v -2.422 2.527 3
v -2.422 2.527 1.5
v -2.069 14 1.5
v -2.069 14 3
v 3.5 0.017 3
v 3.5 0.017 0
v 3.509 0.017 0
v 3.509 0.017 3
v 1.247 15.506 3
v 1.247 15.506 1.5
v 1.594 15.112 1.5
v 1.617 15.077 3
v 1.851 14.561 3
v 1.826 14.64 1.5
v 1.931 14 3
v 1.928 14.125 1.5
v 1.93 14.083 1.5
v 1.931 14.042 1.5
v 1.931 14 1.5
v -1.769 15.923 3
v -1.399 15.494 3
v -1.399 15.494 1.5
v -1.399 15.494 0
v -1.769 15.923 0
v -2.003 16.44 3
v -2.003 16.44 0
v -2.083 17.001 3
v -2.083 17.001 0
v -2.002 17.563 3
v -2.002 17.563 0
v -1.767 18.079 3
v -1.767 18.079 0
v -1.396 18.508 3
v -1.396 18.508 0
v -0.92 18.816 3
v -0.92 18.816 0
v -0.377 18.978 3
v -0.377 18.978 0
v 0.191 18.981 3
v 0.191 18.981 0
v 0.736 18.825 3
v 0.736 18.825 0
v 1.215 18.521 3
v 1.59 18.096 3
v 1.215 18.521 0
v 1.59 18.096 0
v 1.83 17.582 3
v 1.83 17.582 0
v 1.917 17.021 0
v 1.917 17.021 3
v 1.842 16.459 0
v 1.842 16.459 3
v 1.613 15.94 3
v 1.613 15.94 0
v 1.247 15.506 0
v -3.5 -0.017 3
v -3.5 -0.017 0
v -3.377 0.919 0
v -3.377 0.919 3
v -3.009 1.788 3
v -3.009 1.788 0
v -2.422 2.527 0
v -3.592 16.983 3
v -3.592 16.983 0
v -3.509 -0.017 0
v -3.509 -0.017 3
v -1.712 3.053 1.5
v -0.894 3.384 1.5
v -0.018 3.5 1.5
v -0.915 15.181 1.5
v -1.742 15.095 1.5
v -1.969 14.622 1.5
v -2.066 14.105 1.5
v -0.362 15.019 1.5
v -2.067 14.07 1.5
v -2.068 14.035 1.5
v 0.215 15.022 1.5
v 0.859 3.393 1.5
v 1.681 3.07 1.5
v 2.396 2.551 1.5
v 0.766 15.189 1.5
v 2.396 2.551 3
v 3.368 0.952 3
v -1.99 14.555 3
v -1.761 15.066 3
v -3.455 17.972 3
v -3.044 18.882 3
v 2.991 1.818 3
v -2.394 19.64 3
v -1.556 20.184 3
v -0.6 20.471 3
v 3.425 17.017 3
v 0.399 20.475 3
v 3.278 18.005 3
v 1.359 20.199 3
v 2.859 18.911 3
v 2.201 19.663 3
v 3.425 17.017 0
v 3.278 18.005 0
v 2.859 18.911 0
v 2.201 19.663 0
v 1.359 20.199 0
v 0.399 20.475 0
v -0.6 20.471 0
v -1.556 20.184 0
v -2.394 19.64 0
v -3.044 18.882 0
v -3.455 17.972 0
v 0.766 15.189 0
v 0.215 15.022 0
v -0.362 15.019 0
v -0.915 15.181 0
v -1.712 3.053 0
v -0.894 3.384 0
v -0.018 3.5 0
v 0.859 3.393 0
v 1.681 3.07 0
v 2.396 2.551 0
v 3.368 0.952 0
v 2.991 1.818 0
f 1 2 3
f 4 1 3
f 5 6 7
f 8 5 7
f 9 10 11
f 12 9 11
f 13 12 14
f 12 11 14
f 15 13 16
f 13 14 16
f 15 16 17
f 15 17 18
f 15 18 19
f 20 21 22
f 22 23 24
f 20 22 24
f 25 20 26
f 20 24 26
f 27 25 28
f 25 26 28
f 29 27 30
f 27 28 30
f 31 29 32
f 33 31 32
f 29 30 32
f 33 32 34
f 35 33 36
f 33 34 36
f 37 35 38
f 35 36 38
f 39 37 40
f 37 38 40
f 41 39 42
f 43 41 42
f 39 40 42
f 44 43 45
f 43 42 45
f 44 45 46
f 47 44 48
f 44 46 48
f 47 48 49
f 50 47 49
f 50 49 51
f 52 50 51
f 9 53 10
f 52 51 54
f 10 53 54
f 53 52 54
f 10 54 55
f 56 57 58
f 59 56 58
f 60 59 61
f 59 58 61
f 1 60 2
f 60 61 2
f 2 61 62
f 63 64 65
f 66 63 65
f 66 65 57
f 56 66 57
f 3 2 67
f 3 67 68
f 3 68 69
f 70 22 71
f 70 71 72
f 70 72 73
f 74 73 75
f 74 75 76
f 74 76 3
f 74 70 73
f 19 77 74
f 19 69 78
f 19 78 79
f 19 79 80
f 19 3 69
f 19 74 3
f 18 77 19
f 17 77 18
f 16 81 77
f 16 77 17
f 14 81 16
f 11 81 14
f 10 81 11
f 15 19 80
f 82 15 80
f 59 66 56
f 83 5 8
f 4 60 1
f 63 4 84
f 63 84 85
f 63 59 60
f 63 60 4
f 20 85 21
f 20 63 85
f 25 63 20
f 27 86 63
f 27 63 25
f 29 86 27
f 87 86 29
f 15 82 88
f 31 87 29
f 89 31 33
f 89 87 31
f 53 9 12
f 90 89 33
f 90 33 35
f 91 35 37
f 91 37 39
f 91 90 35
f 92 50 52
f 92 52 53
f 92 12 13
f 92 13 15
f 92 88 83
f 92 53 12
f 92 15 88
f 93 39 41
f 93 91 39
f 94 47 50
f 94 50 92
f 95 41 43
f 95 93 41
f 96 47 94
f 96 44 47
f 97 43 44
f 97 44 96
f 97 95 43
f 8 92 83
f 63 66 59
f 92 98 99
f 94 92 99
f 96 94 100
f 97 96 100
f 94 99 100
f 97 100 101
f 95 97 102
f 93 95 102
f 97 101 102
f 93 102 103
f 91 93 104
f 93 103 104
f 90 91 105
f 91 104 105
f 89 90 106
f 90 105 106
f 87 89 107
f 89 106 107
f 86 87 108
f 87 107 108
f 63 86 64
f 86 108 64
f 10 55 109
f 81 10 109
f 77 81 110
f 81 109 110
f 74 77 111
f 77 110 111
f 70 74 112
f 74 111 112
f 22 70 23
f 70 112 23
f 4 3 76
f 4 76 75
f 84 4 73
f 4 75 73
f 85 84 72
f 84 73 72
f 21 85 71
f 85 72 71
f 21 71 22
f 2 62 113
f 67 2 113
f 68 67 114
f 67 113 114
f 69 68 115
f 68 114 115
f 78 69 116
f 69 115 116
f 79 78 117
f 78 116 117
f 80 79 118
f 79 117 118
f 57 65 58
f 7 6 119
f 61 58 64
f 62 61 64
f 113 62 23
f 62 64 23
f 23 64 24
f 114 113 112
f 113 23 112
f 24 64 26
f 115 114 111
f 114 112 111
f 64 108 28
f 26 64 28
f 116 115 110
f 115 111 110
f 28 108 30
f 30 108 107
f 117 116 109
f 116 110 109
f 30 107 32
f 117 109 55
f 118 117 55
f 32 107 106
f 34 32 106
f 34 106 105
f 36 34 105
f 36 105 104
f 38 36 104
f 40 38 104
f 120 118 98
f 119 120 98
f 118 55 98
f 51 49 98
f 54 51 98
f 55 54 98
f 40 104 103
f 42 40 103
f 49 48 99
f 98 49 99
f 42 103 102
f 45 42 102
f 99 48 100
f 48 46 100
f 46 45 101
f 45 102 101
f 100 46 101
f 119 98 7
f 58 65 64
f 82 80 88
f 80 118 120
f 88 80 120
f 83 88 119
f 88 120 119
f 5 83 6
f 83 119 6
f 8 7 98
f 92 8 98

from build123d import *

# Parameters (mm, degrees)
BOSS_EXTRU_1_DEPTH = 3
BOSS_EXTRU_2_DEPTH = 1.5


# Read off the part's stored shape, not the designer's step: Boss.-Extru.1
with BuildPart() as part:
    # Boss.-Extru.1 outline → Boss.-Extru.1 (new body)
    with BuildSketch(Plane.XY):
        with BuildLine():
            Line((-2.42213609, 2.526510788), (-2.068537469, 14))
            ThreePointArc((-2.068537469, 14), (-1.893416293, 14.818423654), (-1.398720191, 15.493523995))
            ThreePointArc((-1.398720191, 15.493523995), (-0.093015019, 18.999976034), (1.246958654, 15.506476005))
            ThreePointArc((1.246958654, 15.506476005), (1.752312916, 14.827347495), (1.931462531, 14))
            Line((1.931462531, 14), (2.396407287, 2.550927696))
            ThreePointArc((2.396407287, 2.550927696), (3.208864051, 1.397566279), (3.49995806, 0.017134162))
            Line((3.49995806, 0.017134162), (3.508676576, 0.017176844))
            Line((3.508676576, 0.017176844), (3.425452507, 17.017176844))
            ThreePointArc((3.425452507, 17.017176844), (-0.100400913, 20.508676576), (-3.591900645, 16.982823156))
            Line((-3.591900645, 16.982823156), (-3.508676576, -0.017176844))
            Line((-3.508676576, -0.017176844), (-3.49995806, -0.017134162))
            ThreePointArc((-3.49995806, -0.017134162), (-3.222628149, 1.3655284), (-2.42213609, 2.526510788))
        make_face()
    extrude(amount=BOSS_EXTRU_1_DEPTH)

    # Esquisse1<5> → Boss.-Extru.2 (add)
    with BuildSketch(Plane.XY):
        with BuildLine():
            ThreePointArc((-2.065775424, 14.105074011), (-2.067846838, 14.052555154), (-2.068537469, 14))
            Line((-2.068537469, 14), (-1.902868639, 14))
            ThreePointArc((-1.902868639, 14), (-1.985047825, 14.051411734), (-2.065775424, 14.105074011))
        make_face()
        with BuildLine():
            Line((-1.902868639, 14), (-2.068537469, 14))
            ThreePointArc((-2.068537469, 14), (-0.068537469, 12), (1.931462531, 14))
            Line((1.931462531, 14), (1.7364205, 14))
            ThreePointArc((1.7364205, 14), (-0.083224069, 13.491281379), (-1.902868639, 14))
        make_face()
        with BuildLine():
            Line((1.7364205, 14), (1.931462531, 14))
            ThreePointArc((1.931462531, 14), (1.930490661, 14.062342092), (1.927575995, 14.124623596))
            ThreePointArc((1.927575995, 14.124623596), (1.833011637, 14.060757397), (1.7364205, 14))
        make_face()
        with BuildLine():
            ThreePointArc((-2.065775424, 14.105074011), (-1.985047825, 14.051411734), (-1.902868639, 14))
            Line((-1.902868639, 14), (1.7364205, 14))
            ThreePointArc((1.7364205, 14), (1.833011637, 14.060757397), (1.927575995, 14.124623596))
            ThreePointArc((1.927575995, 14.124623596), (1.725638814, 14.88370327), (1.246958654, 15.506476005))
            ThreePointArc((1.246958654, 15.506476005), (-0.073433119, 15.000023966), (-1.398720191, 15.493523995))
            ThreePointArc((-1.398720191, 15.493523995), (-1.871279944, 14.866094433), (-2.065775424, 14.105074011))
        make_face()
        with BuildLine():
            Line((1.7364205, 14), (-1.902868639, 14))
            ThreePointArc((-1.902868639, 14), (-0.083224069, 13.491281379), (1.7364205, 14))
        make_face()
        with BuildLine():
            Line((-2.068537469, 14), (-2.42213609, 2.526510788))
            ThreePointArc((-2.42213609, 2.526510788), (-0.017735252, 3.499955066), (2.396407287, 2.550927696))
            Line((2.396407287, 2.550927696), (1.931462531, 14))
            ThreePointArc((1.931462531, 14), (-0.068537469, 12), (-2.068537469, 14))
        make_face()
    extrude(amount=BOSS_EXTRU_2_DEPTH)


solid = part.part
